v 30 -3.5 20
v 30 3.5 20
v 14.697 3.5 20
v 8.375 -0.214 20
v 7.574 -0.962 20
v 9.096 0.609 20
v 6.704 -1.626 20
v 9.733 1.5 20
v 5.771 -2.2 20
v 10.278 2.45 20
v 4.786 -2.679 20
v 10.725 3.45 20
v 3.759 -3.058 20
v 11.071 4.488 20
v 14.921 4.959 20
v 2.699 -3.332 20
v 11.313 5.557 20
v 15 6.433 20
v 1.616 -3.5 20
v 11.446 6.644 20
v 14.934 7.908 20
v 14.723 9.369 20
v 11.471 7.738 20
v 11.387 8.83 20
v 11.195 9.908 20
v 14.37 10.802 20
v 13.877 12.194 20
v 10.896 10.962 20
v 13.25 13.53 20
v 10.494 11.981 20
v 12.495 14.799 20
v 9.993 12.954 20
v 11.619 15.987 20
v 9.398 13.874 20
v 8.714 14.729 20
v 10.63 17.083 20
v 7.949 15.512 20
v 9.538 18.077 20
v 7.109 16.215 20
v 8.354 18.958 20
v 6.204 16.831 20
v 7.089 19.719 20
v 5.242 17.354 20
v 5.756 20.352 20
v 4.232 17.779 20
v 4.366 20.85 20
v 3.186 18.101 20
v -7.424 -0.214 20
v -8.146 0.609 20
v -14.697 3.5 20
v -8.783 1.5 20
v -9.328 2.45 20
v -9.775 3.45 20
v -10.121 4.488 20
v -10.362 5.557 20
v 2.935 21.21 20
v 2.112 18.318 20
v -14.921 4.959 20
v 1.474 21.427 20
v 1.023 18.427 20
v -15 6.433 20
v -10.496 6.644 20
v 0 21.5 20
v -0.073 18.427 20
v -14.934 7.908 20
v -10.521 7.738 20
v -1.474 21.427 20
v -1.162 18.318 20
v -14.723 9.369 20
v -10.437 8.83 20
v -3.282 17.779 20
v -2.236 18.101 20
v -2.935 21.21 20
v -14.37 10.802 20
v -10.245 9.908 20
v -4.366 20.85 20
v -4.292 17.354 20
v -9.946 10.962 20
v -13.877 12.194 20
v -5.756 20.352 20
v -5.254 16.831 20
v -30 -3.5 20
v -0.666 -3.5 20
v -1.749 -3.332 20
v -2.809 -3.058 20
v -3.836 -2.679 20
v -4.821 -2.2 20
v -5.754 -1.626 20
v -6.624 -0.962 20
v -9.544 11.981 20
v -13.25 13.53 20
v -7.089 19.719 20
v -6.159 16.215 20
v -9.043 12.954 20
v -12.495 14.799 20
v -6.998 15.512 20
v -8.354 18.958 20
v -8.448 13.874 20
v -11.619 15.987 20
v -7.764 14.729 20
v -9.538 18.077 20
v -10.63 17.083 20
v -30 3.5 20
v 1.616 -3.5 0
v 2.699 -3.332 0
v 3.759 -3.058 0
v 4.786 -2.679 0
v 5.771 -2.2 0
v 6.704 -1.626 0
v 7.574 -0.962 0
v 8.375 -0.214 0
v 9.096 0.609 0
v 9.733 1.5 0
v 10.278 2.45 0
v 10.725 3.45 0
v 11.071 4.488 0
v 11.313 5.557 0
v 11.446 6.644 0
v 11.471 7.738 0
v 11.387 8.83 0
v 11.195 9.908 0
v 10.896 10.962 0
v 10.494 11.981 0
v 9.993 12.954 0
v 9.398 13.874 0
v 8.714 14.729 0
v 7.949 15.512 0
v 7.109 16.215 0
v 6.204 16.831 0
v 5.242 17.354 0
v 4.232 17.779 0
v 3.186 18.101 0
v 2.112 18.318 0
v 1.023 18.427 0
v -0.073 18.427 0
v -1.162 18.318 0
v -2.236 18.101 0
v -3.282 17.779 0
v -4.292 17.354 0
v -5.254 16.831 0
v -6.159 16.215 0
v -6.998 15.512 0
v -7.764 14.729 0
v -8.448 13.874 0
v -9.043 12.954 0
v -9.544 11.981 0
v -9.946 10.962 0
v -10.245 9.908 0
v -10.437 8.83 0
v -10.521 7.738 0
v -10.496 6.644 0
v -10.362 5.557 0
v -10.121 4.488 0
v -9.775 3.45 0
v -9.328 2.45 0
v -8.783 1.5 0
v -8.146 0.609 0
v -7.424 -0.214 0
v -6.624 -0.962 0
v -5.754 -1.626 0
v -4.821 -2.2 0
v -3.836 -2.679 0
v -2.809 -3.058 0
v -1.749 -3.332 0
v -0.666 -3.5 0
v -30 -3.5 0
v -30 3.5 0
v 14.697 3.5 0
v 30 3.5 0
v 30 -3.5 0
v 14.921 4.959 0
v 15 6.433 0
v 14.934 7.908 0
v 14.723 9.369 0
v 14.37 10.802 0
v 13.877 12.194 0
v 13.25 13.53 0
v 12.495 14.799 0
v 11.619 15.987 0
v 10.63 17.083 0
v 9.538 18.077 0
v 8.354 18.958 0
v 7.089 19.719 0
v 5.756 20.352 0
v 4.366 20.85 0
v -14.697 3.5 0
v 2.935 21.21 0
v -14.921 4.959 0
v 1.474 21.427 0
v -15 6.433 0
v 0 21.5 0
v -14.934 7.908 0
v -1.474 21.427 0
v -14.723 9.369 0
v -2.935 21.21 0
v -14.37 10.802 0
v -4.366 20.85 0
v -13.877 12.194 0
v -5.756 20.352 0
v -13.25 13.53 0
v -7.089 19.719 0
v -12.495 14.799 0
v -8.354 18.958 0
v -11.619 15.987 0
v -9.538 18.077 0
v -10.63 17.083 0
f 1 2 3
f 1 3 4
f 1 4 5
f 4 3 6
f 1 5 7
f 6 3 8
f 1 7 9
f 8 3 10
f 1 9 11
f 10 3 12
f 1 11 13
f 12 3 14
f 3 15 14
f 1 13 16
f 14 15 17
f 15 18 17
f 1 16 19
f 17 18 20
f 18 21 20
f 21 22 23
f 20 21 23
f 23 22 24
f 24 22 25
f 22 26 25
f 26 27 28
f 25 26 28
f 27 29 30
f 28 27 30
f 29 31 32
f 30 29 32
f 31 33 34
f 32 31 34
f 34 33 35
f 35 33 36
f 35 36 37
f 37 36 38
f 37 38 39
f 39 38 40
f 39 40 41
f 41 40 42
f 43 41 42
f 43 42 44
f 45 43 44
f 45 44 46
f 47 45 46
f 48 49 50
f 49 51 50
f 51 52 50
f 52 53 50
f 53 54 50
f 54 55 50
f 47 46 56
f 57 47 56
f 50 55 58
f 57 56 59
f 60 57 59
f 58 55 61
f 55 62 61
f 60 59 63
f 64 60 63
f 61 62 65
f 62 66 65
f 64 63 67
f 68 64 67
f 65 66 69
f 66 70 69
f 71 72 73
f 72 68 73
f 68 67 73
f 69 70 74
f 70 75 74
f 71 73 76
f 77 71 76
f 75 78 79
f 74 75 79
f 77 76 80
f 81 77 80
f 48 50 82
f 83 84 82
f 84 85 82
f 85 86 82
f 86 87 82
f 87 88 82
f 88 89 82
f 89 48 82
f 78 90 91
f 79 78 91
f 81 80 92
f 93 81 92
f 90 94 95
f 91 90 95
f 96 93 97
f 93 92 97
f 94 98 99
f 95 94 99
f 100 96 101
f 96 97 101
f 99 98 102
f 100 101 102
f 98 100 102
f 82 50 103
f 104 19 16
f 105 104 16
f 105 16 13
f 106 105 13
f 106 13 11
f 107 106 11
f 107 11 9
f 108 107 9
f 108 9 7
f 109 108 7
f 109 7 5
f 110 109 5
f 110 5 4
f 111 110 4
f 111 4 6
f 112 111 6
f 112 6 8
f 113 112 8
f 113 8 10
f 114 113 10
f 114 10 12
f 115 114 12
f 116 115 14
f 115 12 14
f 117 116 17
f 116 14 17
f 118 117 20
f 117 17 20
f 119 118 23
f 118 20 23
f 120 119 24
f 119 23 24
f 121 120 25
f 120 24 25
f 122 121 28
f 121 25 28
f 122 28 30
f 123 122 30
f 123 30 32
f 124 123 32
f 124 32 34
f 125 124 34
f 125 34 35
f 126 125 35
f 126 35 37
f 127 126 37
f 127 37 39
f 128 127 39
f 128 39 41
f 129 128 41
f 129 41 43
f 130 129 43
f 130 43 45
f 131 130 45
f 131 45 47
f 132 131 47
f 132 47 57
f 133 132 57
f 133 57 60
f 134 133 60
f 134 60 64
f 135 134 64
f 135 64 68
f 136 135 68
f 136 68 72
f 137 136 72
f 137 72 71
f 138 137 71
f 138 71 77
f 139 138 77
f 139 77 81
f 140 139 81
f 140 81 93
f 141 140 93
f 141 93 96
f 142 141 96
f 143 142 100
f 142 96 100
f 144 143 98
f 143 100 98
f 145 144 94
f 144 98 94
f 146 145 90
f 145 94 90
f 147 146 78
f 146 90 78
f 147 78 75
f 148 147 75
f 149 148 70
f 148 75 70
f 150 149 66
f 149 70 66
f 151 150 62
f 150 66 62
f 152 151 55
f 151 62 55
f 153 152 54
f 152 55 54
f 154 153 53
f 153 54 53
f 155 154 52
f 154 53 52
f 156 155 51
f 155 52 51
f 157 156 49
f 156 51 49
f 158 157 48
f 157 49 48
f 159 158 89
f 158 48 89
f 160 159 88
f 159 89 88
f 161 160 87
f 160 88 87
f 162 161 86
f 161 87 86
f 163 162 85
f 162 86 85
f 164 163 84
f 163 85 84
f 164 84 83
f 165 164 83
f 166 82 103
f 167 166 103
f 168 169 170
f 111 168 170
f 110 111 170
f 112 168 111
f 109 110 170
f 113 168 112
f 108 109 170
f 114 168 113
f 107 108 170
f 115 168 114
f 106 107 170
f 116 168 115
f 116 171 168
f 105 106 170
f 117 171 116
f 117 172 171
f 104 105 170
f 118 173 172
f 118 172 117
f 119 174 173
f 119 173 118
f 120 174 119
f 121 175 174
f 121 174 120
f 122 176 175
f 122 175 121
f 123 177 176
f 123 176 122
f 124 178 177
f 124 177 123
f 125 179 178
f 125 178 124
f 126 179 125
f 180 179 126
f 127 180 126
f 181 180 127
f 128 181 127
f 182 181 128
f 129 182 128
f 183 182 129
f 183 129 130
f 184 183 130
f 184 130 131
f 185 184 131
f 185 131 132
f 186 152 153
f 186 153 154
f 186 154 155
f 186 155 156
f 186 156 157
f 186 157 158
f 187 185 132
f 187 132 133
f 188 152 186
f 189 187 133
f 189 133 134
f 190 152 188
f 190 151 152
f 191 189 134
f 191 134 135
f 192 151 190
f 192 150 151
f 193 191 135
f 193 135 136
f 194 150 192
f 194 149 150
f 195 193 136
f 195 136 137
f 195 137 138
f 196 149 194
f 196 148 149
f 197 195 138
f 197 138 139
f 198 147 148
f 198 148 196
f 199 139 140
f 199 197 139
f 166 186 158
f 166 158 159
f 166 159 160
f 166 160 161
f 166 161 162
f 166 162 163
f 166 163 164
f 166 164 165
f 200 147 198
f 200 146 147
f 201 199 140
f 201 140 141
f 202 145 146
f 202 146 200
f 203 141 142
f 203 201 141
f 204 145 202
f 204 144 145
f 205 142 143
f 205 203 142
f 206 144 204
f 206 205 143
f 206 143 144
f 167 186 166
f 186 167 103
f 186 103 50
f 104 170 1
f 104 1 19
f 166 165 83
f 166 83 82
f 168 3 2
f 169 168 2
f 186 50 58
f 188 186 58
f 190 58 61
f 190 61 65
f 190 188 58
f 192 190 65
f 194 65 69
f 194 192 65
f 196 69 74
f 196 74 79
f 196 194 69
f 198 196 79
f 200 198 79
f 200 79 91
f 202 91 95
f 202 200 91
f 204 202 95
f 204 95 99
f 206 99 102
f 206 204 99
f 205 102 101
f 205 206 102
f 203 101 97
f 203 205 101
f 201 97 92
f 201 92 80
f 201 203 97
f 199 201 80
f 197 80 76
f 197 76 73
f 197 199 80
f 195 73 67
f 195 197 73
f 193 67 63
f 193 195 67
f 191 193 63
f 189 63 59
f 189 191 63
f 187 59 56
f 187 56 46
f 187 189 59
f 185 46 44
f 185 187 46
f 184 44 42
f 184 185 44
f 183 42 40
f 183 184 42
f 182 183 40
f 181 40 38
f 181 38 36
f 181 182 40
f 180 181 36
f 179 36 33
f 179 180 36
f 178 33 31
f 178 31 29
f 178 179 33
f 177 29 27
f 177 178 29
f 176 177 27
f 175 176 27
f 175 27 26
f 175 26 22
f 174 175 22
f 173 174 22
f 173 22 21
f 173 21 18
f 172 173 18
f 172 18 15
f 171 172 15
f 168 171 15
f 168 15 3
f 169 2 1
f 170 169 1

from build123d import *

# Parameters (mm, degrees)
BOSS_EXTRUDE1_DEPTH = 20
SKETCH3_R           = 11
CUT_EXTRUDE1_DEPTH  = 42.979161497


with BuildPart() as part:
    # Sketch1 → Boss-Extrude1 (new body)
    with BuildSketch(Plane.XY):
        with BuildLine():
            Line((14.696938457, 3.5), (30, 3.5))
            Line((30, 3.5), (30, -3.5))
            Line((30, -3.5), (-30, -3.5))
            Line((-30, -3.5), (-30, 3.5))
            Line((-30, 3.5), (-14.696938457, 3.5))
            ThreePointArc((-14.696938457, 3.5), (0, 21.5), (14.696938457, 3.5))
        make_face()
    extrude(amount=BOSS_EXTRUDE1_DEPTH)

    # Sketch3 → Cut-Extrude1 (cut, through all)
    with BuildSketch(Plane.XY.offset(20)):
        with Locations((0.475039653, 7.440620043)):
            Circle(SKETCH3_R)
    extrude(amount=-CUT_EXTRUDE1_DEPTH, mode=Mode.SUBTRACT)


solid = part.part
